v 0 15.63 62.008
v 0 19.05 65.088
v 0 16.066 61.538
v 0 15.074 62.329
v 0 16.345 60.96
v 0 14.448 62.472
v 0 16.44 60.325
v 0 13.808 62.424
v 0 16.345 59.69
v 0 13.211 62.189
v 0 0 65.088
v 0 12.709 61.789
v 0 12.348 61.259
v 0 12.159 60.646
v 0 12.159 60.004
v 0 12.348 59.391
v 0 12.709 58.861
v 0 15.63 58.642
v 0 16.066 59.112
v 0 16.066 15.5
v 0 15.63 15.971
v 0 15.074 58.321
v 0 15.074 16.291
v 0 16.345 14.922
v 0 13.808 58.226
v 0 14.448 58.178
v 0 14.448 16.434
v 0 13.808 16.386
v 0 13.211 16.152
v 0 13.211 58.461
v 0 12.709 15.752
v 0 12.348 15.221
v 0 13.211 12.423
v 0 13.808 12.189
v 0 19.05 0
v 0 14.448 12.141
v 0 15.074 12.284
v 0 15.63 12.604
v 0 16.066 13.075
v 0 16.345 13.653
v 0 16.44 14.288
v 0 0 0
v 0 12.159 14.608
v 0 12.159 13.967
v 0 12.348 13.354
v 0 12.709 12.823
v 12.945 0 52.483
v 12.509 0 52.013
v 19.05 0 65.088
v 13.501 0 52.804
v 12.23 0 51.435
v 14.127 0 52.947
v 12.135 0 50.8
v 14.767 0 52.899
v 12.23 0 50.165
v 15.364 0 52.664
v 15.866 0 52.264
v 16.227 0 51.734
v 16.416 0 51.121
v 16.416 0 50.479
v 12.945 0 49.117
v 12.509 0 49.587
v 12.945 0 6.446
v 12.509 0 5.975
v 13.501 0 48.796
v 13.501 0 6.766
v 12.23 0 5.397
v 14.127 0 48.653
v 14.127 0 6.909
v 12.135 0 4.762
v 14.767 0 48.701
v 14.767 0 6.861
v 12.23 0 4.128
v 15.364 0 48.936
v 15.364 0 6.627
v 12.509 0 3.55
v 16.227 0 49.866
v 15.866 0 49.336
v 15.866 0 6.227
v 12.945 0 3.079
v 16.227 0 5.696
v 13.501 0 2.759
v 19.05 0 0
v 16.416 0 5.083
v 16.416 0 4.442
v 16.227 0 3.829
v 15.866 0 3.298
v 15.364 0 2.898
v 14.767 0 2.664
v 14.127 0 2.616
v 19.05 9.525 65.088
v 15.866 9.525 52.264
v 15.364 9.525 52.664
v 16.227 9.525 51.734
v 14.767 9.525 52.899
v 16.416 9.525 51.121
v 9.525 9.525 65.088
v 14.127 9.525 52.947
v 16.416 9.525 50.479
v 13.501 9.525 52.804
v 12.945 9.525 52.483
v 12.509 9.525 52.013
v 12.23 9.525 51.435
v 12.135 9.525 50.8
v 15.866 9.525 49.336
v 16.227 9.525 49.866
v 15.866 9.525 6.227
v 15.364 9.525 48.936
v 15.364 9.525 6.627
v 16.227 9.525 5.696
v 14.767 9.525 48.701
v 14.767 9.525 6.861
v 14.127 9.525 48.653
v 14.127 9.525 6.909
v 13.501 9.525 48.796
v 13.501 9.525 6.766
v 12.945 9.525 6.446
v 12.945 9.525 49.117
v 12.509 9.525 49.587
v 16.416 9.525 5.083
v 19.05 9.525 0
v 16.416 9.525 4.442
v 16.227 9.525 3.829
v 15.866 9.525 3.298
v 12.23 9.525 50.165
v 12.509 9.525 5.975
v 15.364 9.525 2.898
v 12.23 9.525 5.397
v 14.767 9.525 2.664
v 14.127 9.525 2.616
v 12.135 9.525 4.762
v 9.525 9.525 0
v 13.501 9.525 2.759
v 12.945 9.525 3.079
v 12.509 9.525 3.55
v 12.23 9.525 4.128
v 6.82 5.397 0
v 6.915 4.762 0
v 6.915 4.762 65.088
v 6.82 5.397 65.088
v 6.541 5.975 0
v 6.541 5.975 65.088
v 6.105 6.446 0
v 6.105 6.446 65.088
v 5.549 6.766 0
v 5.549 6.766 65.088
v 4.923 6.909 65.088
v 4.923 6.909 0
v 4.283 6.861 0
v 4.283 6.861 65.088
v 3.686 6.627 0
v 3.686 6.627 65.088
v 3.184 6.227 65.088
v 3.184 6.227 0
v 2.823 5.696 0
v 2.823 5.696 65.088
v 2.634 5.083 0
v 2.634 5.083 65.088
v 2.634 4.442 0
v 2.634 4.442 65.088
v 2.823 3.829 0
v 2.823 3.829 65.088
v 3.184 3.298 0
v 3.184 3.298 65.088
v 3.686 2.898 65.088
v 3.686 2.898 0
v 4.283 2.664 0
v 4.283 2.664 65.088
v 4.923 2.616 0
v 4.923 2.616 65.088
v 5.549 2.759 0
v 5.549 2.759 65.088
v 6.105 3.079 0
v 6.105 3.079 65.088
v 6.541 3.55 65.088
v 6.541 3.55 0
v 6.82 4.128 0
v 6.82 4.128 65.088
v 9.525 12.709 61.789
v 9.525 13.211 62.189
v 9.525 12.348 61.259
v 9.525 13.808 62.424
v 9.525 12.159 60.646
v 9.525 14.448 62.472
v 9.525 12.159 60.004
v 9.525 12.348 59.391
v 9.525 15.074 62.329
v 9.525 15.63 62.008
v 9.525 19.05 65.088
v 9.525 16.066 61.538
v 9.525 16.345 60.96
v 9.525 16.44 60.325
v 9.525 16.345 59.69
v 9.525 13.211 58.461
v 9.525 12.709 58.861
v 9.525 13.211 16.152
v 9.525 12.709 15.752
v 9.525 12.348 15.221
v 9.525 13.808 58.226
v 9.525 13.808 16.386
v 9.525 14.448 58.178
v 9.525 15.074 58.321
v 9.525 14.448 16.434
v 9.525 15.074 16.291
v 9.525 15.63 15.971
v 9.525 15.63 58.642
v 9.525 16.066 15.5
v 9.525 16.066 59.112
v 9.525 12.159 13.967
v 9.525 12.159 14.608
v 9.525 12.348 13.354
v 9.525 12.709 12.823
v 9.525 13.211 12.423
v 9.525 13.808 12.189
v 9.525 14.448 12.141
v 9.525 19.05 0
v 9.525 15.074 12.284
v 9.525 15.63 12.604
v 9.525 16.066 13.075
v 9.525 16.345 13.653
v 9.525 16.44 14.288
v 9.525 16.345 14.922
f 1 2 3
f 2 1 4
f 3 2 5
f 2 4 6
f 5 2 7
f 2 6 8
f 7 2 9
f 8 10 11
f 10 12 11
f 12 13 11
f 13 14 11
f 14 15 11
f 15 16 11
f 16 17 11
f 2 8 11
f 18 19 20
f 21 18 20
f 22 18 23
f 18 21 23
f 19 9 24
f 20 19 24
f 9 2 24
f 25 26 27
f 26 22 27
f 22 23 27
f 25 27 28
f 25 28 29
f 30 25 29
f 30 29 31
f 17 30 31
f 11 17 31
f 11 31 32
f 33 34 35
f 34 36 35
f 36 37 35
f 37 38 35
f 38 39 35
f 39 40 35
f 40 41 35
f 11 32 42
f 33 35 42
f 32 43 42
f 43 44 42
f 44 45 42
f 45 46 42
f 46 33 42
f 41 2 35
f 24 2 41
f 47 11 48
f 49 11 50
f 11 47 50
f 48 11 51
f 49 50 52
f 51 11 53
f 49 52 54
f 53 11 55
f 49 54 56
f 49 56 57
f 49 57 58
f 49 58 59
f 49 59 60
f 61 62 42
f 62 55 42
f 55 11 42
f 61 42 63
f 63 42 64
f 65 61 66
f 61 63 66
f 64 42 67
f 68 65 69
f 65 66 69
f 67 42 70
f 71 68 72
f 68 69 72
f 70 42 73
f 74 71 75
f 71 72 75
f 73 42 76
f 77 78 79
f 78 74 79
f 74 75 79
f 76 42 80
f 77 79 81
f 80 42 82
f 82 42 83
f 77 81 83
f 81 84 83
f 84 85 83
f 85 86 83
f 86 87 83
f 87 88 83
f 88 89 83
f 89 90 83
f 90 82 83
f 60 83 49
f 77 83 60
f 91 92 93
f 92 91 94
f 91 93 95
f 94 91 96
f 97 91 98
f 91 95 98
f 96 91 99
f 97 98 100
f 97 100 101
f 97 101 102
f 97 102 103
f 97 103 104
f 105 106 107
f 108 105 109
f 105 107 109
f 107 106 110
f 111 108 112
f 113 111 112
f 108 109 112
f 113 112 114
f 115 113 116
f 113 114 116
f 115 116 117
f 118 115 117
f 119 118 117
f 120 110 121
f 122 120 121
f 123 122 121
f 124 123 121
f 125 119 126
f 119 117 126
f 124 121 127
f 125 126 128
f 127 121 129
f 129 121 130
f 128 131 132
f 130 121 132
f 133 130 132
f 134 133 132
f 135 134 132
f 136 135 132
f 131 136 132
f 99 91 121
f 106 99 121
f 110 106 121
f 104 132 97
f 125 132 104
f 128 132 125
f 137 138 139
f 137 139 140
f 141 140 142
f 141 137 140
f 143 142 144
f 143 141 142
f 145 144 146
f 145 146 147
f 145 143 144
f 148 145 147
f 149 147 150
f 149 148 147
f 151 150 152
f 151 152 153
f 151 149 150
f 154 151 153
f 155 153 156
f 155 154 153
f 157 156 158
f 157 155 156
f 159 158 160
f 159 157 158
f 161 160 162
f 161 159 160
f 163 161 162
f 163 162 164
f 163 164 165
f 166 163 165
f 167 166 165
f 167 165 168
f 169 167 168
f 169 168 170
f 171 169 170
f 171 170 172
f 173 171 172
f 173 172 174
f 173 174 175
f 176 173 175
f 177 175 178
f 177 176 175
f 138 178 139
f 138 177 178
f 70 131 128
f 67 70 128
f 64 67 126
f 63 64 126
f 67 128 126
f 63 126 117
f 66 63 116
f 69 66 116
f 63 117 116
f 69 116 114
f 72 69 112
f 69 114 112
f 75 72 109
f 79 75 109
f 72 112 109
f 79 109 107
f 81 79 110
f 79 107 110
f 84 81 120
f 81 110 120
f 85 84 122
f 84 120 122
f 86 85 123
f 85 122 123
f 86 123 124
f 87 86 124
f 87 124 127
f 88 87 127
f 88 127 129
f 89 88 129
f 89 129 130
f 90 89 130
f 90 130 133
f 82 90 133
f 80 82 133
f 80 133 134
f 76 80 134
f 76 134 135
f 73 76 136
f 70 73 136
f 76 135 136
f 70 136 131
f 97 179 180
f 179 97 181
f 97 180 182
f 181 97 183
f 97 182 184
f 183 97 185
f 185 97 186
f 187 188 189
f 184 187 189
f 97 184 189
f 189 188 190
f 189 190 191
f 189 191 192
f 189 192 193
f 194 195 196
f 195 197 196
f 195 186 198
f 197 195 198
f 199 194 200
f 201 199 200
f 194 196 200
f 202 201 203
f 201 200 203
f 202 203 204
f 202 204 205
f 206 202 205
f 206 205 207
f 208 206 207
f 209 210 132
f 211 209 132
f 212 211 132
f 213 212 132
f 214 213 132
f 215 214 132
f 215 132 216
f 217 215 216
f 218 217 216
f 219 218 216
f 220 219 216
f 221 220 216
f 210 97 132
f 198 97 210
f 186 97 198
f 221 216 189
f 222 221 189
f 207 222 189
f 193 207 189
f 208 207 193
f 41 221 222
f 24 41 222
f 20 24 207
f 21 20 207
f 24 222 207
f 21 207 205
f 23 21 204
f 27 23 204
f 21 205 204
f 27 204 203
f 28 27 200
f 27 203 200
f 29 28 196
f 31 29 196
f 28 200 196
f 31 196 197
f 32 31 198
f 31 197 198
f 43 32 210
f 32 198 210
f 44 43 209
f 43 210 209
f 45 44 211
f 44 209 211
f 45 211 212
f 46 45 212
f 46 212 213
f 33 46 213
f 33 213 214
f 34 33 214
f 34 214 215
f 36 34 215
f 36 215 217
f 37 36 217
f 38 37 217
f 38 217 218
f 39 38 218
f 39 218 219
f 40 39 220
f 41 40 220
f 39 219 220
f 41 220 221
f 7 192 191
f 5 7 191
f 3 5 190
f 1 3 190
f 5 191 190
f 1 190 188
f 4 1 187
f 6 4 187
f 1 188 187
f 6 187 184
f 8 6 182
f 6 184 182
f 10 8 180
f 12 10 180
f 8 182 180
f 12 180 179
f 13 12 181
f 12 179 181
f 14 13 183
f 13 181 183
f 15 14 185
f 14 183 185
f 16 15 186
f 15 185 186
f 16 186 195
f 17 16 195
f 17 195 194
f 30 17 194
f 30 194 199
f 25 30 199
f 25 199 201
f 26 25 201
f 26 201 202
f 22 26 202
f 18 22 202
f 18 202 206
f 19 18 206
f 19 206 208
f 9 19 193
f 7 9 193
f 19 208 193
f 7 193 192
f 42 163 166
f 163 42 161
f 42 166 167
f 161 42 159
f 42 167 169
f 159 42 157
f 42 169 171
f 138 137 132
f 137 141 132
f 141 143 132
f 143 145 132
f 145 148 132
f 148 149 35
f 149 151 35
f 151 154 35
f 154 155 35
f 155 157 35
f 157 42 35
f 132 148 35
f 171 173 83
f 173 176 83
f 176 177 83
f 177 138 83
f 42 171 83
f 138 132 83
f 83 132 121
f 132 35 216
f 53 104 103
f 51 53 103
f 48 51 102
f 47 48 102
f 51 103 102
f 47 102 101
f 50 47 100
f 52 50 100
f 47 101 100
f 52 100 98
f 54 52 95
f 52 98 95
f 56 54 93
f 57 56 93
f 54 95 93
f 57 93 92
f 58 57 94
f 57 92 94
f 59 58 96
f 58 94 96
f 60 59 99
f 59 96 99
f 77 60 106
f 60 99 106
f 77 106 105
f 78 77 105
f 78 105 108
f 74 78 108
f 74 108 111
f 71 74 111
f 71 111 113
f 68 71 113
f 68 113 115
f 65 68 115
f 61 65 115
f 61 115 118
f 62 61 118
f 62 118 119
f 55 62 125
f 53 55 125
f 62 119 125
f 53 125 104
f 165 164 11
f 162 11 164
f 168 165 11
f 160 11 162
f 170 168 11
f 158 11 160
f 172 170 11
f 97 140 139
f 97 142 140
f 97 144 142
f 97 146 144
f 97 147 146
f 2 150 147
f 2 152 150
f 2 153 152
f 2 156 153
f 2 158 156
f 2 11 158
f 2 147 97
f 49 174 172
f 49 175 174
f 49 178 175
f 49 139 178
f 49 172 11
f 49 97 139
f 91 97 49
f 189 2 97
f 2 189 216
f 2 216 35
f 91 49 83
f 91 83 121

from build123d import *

# Parameters (mm, degrees)
F0_R     = 2.15265
F1_DEPTH = 65.0875
F2_R     = 2.15265
F3_DEPTH = 9.525
F4_R     = 2.15265
F5_DEPTH = 9.525


with BuildPart() as f1:
    # F0 (on Top) → F1 (new body)
    with BuildSketch(Plane.XY):
        Polygon((0, 19.05), (0, 0), (19.05, 0), (19.05, 9.525), (9.525, 9.525), (9.525, 19.05), align=None)
        with Locations((4.7625, 4.7625)):
            Circle(F0_R, mode=Mode.SUBTRACT)
    extrude(amount=F1_DEPTH)

    # F2 (on face) → F3 (cut, through all)
    with BuildSketch(Plane.YZ.offset(9.525)):
        with Locations((14.2875, 60.325)):
            Circle(F2_R)
        with Locations((14.2875, 14.2875)):
            Circle(F2_R)
    extrude(amount=-F3_DEPTH, mode=Mode.SUBTRACT)

    # F4 (on face) → F5 (cut, through all)
    with BuildSketch(Plane(origin=(0, 9.525, 0), x_dir=(-1, 0, 0), z_dir=(0, 1, 0))):
        with Locations((-14.2875, 50.8)):
            Circle(F4_R)
        with Locations((-14.2875, 4.7625)):
            Circle(F4_R)
    extrude(amount=-F5_DEPTH, mode=Mode.SUBTRACT)


solid = f1.part
